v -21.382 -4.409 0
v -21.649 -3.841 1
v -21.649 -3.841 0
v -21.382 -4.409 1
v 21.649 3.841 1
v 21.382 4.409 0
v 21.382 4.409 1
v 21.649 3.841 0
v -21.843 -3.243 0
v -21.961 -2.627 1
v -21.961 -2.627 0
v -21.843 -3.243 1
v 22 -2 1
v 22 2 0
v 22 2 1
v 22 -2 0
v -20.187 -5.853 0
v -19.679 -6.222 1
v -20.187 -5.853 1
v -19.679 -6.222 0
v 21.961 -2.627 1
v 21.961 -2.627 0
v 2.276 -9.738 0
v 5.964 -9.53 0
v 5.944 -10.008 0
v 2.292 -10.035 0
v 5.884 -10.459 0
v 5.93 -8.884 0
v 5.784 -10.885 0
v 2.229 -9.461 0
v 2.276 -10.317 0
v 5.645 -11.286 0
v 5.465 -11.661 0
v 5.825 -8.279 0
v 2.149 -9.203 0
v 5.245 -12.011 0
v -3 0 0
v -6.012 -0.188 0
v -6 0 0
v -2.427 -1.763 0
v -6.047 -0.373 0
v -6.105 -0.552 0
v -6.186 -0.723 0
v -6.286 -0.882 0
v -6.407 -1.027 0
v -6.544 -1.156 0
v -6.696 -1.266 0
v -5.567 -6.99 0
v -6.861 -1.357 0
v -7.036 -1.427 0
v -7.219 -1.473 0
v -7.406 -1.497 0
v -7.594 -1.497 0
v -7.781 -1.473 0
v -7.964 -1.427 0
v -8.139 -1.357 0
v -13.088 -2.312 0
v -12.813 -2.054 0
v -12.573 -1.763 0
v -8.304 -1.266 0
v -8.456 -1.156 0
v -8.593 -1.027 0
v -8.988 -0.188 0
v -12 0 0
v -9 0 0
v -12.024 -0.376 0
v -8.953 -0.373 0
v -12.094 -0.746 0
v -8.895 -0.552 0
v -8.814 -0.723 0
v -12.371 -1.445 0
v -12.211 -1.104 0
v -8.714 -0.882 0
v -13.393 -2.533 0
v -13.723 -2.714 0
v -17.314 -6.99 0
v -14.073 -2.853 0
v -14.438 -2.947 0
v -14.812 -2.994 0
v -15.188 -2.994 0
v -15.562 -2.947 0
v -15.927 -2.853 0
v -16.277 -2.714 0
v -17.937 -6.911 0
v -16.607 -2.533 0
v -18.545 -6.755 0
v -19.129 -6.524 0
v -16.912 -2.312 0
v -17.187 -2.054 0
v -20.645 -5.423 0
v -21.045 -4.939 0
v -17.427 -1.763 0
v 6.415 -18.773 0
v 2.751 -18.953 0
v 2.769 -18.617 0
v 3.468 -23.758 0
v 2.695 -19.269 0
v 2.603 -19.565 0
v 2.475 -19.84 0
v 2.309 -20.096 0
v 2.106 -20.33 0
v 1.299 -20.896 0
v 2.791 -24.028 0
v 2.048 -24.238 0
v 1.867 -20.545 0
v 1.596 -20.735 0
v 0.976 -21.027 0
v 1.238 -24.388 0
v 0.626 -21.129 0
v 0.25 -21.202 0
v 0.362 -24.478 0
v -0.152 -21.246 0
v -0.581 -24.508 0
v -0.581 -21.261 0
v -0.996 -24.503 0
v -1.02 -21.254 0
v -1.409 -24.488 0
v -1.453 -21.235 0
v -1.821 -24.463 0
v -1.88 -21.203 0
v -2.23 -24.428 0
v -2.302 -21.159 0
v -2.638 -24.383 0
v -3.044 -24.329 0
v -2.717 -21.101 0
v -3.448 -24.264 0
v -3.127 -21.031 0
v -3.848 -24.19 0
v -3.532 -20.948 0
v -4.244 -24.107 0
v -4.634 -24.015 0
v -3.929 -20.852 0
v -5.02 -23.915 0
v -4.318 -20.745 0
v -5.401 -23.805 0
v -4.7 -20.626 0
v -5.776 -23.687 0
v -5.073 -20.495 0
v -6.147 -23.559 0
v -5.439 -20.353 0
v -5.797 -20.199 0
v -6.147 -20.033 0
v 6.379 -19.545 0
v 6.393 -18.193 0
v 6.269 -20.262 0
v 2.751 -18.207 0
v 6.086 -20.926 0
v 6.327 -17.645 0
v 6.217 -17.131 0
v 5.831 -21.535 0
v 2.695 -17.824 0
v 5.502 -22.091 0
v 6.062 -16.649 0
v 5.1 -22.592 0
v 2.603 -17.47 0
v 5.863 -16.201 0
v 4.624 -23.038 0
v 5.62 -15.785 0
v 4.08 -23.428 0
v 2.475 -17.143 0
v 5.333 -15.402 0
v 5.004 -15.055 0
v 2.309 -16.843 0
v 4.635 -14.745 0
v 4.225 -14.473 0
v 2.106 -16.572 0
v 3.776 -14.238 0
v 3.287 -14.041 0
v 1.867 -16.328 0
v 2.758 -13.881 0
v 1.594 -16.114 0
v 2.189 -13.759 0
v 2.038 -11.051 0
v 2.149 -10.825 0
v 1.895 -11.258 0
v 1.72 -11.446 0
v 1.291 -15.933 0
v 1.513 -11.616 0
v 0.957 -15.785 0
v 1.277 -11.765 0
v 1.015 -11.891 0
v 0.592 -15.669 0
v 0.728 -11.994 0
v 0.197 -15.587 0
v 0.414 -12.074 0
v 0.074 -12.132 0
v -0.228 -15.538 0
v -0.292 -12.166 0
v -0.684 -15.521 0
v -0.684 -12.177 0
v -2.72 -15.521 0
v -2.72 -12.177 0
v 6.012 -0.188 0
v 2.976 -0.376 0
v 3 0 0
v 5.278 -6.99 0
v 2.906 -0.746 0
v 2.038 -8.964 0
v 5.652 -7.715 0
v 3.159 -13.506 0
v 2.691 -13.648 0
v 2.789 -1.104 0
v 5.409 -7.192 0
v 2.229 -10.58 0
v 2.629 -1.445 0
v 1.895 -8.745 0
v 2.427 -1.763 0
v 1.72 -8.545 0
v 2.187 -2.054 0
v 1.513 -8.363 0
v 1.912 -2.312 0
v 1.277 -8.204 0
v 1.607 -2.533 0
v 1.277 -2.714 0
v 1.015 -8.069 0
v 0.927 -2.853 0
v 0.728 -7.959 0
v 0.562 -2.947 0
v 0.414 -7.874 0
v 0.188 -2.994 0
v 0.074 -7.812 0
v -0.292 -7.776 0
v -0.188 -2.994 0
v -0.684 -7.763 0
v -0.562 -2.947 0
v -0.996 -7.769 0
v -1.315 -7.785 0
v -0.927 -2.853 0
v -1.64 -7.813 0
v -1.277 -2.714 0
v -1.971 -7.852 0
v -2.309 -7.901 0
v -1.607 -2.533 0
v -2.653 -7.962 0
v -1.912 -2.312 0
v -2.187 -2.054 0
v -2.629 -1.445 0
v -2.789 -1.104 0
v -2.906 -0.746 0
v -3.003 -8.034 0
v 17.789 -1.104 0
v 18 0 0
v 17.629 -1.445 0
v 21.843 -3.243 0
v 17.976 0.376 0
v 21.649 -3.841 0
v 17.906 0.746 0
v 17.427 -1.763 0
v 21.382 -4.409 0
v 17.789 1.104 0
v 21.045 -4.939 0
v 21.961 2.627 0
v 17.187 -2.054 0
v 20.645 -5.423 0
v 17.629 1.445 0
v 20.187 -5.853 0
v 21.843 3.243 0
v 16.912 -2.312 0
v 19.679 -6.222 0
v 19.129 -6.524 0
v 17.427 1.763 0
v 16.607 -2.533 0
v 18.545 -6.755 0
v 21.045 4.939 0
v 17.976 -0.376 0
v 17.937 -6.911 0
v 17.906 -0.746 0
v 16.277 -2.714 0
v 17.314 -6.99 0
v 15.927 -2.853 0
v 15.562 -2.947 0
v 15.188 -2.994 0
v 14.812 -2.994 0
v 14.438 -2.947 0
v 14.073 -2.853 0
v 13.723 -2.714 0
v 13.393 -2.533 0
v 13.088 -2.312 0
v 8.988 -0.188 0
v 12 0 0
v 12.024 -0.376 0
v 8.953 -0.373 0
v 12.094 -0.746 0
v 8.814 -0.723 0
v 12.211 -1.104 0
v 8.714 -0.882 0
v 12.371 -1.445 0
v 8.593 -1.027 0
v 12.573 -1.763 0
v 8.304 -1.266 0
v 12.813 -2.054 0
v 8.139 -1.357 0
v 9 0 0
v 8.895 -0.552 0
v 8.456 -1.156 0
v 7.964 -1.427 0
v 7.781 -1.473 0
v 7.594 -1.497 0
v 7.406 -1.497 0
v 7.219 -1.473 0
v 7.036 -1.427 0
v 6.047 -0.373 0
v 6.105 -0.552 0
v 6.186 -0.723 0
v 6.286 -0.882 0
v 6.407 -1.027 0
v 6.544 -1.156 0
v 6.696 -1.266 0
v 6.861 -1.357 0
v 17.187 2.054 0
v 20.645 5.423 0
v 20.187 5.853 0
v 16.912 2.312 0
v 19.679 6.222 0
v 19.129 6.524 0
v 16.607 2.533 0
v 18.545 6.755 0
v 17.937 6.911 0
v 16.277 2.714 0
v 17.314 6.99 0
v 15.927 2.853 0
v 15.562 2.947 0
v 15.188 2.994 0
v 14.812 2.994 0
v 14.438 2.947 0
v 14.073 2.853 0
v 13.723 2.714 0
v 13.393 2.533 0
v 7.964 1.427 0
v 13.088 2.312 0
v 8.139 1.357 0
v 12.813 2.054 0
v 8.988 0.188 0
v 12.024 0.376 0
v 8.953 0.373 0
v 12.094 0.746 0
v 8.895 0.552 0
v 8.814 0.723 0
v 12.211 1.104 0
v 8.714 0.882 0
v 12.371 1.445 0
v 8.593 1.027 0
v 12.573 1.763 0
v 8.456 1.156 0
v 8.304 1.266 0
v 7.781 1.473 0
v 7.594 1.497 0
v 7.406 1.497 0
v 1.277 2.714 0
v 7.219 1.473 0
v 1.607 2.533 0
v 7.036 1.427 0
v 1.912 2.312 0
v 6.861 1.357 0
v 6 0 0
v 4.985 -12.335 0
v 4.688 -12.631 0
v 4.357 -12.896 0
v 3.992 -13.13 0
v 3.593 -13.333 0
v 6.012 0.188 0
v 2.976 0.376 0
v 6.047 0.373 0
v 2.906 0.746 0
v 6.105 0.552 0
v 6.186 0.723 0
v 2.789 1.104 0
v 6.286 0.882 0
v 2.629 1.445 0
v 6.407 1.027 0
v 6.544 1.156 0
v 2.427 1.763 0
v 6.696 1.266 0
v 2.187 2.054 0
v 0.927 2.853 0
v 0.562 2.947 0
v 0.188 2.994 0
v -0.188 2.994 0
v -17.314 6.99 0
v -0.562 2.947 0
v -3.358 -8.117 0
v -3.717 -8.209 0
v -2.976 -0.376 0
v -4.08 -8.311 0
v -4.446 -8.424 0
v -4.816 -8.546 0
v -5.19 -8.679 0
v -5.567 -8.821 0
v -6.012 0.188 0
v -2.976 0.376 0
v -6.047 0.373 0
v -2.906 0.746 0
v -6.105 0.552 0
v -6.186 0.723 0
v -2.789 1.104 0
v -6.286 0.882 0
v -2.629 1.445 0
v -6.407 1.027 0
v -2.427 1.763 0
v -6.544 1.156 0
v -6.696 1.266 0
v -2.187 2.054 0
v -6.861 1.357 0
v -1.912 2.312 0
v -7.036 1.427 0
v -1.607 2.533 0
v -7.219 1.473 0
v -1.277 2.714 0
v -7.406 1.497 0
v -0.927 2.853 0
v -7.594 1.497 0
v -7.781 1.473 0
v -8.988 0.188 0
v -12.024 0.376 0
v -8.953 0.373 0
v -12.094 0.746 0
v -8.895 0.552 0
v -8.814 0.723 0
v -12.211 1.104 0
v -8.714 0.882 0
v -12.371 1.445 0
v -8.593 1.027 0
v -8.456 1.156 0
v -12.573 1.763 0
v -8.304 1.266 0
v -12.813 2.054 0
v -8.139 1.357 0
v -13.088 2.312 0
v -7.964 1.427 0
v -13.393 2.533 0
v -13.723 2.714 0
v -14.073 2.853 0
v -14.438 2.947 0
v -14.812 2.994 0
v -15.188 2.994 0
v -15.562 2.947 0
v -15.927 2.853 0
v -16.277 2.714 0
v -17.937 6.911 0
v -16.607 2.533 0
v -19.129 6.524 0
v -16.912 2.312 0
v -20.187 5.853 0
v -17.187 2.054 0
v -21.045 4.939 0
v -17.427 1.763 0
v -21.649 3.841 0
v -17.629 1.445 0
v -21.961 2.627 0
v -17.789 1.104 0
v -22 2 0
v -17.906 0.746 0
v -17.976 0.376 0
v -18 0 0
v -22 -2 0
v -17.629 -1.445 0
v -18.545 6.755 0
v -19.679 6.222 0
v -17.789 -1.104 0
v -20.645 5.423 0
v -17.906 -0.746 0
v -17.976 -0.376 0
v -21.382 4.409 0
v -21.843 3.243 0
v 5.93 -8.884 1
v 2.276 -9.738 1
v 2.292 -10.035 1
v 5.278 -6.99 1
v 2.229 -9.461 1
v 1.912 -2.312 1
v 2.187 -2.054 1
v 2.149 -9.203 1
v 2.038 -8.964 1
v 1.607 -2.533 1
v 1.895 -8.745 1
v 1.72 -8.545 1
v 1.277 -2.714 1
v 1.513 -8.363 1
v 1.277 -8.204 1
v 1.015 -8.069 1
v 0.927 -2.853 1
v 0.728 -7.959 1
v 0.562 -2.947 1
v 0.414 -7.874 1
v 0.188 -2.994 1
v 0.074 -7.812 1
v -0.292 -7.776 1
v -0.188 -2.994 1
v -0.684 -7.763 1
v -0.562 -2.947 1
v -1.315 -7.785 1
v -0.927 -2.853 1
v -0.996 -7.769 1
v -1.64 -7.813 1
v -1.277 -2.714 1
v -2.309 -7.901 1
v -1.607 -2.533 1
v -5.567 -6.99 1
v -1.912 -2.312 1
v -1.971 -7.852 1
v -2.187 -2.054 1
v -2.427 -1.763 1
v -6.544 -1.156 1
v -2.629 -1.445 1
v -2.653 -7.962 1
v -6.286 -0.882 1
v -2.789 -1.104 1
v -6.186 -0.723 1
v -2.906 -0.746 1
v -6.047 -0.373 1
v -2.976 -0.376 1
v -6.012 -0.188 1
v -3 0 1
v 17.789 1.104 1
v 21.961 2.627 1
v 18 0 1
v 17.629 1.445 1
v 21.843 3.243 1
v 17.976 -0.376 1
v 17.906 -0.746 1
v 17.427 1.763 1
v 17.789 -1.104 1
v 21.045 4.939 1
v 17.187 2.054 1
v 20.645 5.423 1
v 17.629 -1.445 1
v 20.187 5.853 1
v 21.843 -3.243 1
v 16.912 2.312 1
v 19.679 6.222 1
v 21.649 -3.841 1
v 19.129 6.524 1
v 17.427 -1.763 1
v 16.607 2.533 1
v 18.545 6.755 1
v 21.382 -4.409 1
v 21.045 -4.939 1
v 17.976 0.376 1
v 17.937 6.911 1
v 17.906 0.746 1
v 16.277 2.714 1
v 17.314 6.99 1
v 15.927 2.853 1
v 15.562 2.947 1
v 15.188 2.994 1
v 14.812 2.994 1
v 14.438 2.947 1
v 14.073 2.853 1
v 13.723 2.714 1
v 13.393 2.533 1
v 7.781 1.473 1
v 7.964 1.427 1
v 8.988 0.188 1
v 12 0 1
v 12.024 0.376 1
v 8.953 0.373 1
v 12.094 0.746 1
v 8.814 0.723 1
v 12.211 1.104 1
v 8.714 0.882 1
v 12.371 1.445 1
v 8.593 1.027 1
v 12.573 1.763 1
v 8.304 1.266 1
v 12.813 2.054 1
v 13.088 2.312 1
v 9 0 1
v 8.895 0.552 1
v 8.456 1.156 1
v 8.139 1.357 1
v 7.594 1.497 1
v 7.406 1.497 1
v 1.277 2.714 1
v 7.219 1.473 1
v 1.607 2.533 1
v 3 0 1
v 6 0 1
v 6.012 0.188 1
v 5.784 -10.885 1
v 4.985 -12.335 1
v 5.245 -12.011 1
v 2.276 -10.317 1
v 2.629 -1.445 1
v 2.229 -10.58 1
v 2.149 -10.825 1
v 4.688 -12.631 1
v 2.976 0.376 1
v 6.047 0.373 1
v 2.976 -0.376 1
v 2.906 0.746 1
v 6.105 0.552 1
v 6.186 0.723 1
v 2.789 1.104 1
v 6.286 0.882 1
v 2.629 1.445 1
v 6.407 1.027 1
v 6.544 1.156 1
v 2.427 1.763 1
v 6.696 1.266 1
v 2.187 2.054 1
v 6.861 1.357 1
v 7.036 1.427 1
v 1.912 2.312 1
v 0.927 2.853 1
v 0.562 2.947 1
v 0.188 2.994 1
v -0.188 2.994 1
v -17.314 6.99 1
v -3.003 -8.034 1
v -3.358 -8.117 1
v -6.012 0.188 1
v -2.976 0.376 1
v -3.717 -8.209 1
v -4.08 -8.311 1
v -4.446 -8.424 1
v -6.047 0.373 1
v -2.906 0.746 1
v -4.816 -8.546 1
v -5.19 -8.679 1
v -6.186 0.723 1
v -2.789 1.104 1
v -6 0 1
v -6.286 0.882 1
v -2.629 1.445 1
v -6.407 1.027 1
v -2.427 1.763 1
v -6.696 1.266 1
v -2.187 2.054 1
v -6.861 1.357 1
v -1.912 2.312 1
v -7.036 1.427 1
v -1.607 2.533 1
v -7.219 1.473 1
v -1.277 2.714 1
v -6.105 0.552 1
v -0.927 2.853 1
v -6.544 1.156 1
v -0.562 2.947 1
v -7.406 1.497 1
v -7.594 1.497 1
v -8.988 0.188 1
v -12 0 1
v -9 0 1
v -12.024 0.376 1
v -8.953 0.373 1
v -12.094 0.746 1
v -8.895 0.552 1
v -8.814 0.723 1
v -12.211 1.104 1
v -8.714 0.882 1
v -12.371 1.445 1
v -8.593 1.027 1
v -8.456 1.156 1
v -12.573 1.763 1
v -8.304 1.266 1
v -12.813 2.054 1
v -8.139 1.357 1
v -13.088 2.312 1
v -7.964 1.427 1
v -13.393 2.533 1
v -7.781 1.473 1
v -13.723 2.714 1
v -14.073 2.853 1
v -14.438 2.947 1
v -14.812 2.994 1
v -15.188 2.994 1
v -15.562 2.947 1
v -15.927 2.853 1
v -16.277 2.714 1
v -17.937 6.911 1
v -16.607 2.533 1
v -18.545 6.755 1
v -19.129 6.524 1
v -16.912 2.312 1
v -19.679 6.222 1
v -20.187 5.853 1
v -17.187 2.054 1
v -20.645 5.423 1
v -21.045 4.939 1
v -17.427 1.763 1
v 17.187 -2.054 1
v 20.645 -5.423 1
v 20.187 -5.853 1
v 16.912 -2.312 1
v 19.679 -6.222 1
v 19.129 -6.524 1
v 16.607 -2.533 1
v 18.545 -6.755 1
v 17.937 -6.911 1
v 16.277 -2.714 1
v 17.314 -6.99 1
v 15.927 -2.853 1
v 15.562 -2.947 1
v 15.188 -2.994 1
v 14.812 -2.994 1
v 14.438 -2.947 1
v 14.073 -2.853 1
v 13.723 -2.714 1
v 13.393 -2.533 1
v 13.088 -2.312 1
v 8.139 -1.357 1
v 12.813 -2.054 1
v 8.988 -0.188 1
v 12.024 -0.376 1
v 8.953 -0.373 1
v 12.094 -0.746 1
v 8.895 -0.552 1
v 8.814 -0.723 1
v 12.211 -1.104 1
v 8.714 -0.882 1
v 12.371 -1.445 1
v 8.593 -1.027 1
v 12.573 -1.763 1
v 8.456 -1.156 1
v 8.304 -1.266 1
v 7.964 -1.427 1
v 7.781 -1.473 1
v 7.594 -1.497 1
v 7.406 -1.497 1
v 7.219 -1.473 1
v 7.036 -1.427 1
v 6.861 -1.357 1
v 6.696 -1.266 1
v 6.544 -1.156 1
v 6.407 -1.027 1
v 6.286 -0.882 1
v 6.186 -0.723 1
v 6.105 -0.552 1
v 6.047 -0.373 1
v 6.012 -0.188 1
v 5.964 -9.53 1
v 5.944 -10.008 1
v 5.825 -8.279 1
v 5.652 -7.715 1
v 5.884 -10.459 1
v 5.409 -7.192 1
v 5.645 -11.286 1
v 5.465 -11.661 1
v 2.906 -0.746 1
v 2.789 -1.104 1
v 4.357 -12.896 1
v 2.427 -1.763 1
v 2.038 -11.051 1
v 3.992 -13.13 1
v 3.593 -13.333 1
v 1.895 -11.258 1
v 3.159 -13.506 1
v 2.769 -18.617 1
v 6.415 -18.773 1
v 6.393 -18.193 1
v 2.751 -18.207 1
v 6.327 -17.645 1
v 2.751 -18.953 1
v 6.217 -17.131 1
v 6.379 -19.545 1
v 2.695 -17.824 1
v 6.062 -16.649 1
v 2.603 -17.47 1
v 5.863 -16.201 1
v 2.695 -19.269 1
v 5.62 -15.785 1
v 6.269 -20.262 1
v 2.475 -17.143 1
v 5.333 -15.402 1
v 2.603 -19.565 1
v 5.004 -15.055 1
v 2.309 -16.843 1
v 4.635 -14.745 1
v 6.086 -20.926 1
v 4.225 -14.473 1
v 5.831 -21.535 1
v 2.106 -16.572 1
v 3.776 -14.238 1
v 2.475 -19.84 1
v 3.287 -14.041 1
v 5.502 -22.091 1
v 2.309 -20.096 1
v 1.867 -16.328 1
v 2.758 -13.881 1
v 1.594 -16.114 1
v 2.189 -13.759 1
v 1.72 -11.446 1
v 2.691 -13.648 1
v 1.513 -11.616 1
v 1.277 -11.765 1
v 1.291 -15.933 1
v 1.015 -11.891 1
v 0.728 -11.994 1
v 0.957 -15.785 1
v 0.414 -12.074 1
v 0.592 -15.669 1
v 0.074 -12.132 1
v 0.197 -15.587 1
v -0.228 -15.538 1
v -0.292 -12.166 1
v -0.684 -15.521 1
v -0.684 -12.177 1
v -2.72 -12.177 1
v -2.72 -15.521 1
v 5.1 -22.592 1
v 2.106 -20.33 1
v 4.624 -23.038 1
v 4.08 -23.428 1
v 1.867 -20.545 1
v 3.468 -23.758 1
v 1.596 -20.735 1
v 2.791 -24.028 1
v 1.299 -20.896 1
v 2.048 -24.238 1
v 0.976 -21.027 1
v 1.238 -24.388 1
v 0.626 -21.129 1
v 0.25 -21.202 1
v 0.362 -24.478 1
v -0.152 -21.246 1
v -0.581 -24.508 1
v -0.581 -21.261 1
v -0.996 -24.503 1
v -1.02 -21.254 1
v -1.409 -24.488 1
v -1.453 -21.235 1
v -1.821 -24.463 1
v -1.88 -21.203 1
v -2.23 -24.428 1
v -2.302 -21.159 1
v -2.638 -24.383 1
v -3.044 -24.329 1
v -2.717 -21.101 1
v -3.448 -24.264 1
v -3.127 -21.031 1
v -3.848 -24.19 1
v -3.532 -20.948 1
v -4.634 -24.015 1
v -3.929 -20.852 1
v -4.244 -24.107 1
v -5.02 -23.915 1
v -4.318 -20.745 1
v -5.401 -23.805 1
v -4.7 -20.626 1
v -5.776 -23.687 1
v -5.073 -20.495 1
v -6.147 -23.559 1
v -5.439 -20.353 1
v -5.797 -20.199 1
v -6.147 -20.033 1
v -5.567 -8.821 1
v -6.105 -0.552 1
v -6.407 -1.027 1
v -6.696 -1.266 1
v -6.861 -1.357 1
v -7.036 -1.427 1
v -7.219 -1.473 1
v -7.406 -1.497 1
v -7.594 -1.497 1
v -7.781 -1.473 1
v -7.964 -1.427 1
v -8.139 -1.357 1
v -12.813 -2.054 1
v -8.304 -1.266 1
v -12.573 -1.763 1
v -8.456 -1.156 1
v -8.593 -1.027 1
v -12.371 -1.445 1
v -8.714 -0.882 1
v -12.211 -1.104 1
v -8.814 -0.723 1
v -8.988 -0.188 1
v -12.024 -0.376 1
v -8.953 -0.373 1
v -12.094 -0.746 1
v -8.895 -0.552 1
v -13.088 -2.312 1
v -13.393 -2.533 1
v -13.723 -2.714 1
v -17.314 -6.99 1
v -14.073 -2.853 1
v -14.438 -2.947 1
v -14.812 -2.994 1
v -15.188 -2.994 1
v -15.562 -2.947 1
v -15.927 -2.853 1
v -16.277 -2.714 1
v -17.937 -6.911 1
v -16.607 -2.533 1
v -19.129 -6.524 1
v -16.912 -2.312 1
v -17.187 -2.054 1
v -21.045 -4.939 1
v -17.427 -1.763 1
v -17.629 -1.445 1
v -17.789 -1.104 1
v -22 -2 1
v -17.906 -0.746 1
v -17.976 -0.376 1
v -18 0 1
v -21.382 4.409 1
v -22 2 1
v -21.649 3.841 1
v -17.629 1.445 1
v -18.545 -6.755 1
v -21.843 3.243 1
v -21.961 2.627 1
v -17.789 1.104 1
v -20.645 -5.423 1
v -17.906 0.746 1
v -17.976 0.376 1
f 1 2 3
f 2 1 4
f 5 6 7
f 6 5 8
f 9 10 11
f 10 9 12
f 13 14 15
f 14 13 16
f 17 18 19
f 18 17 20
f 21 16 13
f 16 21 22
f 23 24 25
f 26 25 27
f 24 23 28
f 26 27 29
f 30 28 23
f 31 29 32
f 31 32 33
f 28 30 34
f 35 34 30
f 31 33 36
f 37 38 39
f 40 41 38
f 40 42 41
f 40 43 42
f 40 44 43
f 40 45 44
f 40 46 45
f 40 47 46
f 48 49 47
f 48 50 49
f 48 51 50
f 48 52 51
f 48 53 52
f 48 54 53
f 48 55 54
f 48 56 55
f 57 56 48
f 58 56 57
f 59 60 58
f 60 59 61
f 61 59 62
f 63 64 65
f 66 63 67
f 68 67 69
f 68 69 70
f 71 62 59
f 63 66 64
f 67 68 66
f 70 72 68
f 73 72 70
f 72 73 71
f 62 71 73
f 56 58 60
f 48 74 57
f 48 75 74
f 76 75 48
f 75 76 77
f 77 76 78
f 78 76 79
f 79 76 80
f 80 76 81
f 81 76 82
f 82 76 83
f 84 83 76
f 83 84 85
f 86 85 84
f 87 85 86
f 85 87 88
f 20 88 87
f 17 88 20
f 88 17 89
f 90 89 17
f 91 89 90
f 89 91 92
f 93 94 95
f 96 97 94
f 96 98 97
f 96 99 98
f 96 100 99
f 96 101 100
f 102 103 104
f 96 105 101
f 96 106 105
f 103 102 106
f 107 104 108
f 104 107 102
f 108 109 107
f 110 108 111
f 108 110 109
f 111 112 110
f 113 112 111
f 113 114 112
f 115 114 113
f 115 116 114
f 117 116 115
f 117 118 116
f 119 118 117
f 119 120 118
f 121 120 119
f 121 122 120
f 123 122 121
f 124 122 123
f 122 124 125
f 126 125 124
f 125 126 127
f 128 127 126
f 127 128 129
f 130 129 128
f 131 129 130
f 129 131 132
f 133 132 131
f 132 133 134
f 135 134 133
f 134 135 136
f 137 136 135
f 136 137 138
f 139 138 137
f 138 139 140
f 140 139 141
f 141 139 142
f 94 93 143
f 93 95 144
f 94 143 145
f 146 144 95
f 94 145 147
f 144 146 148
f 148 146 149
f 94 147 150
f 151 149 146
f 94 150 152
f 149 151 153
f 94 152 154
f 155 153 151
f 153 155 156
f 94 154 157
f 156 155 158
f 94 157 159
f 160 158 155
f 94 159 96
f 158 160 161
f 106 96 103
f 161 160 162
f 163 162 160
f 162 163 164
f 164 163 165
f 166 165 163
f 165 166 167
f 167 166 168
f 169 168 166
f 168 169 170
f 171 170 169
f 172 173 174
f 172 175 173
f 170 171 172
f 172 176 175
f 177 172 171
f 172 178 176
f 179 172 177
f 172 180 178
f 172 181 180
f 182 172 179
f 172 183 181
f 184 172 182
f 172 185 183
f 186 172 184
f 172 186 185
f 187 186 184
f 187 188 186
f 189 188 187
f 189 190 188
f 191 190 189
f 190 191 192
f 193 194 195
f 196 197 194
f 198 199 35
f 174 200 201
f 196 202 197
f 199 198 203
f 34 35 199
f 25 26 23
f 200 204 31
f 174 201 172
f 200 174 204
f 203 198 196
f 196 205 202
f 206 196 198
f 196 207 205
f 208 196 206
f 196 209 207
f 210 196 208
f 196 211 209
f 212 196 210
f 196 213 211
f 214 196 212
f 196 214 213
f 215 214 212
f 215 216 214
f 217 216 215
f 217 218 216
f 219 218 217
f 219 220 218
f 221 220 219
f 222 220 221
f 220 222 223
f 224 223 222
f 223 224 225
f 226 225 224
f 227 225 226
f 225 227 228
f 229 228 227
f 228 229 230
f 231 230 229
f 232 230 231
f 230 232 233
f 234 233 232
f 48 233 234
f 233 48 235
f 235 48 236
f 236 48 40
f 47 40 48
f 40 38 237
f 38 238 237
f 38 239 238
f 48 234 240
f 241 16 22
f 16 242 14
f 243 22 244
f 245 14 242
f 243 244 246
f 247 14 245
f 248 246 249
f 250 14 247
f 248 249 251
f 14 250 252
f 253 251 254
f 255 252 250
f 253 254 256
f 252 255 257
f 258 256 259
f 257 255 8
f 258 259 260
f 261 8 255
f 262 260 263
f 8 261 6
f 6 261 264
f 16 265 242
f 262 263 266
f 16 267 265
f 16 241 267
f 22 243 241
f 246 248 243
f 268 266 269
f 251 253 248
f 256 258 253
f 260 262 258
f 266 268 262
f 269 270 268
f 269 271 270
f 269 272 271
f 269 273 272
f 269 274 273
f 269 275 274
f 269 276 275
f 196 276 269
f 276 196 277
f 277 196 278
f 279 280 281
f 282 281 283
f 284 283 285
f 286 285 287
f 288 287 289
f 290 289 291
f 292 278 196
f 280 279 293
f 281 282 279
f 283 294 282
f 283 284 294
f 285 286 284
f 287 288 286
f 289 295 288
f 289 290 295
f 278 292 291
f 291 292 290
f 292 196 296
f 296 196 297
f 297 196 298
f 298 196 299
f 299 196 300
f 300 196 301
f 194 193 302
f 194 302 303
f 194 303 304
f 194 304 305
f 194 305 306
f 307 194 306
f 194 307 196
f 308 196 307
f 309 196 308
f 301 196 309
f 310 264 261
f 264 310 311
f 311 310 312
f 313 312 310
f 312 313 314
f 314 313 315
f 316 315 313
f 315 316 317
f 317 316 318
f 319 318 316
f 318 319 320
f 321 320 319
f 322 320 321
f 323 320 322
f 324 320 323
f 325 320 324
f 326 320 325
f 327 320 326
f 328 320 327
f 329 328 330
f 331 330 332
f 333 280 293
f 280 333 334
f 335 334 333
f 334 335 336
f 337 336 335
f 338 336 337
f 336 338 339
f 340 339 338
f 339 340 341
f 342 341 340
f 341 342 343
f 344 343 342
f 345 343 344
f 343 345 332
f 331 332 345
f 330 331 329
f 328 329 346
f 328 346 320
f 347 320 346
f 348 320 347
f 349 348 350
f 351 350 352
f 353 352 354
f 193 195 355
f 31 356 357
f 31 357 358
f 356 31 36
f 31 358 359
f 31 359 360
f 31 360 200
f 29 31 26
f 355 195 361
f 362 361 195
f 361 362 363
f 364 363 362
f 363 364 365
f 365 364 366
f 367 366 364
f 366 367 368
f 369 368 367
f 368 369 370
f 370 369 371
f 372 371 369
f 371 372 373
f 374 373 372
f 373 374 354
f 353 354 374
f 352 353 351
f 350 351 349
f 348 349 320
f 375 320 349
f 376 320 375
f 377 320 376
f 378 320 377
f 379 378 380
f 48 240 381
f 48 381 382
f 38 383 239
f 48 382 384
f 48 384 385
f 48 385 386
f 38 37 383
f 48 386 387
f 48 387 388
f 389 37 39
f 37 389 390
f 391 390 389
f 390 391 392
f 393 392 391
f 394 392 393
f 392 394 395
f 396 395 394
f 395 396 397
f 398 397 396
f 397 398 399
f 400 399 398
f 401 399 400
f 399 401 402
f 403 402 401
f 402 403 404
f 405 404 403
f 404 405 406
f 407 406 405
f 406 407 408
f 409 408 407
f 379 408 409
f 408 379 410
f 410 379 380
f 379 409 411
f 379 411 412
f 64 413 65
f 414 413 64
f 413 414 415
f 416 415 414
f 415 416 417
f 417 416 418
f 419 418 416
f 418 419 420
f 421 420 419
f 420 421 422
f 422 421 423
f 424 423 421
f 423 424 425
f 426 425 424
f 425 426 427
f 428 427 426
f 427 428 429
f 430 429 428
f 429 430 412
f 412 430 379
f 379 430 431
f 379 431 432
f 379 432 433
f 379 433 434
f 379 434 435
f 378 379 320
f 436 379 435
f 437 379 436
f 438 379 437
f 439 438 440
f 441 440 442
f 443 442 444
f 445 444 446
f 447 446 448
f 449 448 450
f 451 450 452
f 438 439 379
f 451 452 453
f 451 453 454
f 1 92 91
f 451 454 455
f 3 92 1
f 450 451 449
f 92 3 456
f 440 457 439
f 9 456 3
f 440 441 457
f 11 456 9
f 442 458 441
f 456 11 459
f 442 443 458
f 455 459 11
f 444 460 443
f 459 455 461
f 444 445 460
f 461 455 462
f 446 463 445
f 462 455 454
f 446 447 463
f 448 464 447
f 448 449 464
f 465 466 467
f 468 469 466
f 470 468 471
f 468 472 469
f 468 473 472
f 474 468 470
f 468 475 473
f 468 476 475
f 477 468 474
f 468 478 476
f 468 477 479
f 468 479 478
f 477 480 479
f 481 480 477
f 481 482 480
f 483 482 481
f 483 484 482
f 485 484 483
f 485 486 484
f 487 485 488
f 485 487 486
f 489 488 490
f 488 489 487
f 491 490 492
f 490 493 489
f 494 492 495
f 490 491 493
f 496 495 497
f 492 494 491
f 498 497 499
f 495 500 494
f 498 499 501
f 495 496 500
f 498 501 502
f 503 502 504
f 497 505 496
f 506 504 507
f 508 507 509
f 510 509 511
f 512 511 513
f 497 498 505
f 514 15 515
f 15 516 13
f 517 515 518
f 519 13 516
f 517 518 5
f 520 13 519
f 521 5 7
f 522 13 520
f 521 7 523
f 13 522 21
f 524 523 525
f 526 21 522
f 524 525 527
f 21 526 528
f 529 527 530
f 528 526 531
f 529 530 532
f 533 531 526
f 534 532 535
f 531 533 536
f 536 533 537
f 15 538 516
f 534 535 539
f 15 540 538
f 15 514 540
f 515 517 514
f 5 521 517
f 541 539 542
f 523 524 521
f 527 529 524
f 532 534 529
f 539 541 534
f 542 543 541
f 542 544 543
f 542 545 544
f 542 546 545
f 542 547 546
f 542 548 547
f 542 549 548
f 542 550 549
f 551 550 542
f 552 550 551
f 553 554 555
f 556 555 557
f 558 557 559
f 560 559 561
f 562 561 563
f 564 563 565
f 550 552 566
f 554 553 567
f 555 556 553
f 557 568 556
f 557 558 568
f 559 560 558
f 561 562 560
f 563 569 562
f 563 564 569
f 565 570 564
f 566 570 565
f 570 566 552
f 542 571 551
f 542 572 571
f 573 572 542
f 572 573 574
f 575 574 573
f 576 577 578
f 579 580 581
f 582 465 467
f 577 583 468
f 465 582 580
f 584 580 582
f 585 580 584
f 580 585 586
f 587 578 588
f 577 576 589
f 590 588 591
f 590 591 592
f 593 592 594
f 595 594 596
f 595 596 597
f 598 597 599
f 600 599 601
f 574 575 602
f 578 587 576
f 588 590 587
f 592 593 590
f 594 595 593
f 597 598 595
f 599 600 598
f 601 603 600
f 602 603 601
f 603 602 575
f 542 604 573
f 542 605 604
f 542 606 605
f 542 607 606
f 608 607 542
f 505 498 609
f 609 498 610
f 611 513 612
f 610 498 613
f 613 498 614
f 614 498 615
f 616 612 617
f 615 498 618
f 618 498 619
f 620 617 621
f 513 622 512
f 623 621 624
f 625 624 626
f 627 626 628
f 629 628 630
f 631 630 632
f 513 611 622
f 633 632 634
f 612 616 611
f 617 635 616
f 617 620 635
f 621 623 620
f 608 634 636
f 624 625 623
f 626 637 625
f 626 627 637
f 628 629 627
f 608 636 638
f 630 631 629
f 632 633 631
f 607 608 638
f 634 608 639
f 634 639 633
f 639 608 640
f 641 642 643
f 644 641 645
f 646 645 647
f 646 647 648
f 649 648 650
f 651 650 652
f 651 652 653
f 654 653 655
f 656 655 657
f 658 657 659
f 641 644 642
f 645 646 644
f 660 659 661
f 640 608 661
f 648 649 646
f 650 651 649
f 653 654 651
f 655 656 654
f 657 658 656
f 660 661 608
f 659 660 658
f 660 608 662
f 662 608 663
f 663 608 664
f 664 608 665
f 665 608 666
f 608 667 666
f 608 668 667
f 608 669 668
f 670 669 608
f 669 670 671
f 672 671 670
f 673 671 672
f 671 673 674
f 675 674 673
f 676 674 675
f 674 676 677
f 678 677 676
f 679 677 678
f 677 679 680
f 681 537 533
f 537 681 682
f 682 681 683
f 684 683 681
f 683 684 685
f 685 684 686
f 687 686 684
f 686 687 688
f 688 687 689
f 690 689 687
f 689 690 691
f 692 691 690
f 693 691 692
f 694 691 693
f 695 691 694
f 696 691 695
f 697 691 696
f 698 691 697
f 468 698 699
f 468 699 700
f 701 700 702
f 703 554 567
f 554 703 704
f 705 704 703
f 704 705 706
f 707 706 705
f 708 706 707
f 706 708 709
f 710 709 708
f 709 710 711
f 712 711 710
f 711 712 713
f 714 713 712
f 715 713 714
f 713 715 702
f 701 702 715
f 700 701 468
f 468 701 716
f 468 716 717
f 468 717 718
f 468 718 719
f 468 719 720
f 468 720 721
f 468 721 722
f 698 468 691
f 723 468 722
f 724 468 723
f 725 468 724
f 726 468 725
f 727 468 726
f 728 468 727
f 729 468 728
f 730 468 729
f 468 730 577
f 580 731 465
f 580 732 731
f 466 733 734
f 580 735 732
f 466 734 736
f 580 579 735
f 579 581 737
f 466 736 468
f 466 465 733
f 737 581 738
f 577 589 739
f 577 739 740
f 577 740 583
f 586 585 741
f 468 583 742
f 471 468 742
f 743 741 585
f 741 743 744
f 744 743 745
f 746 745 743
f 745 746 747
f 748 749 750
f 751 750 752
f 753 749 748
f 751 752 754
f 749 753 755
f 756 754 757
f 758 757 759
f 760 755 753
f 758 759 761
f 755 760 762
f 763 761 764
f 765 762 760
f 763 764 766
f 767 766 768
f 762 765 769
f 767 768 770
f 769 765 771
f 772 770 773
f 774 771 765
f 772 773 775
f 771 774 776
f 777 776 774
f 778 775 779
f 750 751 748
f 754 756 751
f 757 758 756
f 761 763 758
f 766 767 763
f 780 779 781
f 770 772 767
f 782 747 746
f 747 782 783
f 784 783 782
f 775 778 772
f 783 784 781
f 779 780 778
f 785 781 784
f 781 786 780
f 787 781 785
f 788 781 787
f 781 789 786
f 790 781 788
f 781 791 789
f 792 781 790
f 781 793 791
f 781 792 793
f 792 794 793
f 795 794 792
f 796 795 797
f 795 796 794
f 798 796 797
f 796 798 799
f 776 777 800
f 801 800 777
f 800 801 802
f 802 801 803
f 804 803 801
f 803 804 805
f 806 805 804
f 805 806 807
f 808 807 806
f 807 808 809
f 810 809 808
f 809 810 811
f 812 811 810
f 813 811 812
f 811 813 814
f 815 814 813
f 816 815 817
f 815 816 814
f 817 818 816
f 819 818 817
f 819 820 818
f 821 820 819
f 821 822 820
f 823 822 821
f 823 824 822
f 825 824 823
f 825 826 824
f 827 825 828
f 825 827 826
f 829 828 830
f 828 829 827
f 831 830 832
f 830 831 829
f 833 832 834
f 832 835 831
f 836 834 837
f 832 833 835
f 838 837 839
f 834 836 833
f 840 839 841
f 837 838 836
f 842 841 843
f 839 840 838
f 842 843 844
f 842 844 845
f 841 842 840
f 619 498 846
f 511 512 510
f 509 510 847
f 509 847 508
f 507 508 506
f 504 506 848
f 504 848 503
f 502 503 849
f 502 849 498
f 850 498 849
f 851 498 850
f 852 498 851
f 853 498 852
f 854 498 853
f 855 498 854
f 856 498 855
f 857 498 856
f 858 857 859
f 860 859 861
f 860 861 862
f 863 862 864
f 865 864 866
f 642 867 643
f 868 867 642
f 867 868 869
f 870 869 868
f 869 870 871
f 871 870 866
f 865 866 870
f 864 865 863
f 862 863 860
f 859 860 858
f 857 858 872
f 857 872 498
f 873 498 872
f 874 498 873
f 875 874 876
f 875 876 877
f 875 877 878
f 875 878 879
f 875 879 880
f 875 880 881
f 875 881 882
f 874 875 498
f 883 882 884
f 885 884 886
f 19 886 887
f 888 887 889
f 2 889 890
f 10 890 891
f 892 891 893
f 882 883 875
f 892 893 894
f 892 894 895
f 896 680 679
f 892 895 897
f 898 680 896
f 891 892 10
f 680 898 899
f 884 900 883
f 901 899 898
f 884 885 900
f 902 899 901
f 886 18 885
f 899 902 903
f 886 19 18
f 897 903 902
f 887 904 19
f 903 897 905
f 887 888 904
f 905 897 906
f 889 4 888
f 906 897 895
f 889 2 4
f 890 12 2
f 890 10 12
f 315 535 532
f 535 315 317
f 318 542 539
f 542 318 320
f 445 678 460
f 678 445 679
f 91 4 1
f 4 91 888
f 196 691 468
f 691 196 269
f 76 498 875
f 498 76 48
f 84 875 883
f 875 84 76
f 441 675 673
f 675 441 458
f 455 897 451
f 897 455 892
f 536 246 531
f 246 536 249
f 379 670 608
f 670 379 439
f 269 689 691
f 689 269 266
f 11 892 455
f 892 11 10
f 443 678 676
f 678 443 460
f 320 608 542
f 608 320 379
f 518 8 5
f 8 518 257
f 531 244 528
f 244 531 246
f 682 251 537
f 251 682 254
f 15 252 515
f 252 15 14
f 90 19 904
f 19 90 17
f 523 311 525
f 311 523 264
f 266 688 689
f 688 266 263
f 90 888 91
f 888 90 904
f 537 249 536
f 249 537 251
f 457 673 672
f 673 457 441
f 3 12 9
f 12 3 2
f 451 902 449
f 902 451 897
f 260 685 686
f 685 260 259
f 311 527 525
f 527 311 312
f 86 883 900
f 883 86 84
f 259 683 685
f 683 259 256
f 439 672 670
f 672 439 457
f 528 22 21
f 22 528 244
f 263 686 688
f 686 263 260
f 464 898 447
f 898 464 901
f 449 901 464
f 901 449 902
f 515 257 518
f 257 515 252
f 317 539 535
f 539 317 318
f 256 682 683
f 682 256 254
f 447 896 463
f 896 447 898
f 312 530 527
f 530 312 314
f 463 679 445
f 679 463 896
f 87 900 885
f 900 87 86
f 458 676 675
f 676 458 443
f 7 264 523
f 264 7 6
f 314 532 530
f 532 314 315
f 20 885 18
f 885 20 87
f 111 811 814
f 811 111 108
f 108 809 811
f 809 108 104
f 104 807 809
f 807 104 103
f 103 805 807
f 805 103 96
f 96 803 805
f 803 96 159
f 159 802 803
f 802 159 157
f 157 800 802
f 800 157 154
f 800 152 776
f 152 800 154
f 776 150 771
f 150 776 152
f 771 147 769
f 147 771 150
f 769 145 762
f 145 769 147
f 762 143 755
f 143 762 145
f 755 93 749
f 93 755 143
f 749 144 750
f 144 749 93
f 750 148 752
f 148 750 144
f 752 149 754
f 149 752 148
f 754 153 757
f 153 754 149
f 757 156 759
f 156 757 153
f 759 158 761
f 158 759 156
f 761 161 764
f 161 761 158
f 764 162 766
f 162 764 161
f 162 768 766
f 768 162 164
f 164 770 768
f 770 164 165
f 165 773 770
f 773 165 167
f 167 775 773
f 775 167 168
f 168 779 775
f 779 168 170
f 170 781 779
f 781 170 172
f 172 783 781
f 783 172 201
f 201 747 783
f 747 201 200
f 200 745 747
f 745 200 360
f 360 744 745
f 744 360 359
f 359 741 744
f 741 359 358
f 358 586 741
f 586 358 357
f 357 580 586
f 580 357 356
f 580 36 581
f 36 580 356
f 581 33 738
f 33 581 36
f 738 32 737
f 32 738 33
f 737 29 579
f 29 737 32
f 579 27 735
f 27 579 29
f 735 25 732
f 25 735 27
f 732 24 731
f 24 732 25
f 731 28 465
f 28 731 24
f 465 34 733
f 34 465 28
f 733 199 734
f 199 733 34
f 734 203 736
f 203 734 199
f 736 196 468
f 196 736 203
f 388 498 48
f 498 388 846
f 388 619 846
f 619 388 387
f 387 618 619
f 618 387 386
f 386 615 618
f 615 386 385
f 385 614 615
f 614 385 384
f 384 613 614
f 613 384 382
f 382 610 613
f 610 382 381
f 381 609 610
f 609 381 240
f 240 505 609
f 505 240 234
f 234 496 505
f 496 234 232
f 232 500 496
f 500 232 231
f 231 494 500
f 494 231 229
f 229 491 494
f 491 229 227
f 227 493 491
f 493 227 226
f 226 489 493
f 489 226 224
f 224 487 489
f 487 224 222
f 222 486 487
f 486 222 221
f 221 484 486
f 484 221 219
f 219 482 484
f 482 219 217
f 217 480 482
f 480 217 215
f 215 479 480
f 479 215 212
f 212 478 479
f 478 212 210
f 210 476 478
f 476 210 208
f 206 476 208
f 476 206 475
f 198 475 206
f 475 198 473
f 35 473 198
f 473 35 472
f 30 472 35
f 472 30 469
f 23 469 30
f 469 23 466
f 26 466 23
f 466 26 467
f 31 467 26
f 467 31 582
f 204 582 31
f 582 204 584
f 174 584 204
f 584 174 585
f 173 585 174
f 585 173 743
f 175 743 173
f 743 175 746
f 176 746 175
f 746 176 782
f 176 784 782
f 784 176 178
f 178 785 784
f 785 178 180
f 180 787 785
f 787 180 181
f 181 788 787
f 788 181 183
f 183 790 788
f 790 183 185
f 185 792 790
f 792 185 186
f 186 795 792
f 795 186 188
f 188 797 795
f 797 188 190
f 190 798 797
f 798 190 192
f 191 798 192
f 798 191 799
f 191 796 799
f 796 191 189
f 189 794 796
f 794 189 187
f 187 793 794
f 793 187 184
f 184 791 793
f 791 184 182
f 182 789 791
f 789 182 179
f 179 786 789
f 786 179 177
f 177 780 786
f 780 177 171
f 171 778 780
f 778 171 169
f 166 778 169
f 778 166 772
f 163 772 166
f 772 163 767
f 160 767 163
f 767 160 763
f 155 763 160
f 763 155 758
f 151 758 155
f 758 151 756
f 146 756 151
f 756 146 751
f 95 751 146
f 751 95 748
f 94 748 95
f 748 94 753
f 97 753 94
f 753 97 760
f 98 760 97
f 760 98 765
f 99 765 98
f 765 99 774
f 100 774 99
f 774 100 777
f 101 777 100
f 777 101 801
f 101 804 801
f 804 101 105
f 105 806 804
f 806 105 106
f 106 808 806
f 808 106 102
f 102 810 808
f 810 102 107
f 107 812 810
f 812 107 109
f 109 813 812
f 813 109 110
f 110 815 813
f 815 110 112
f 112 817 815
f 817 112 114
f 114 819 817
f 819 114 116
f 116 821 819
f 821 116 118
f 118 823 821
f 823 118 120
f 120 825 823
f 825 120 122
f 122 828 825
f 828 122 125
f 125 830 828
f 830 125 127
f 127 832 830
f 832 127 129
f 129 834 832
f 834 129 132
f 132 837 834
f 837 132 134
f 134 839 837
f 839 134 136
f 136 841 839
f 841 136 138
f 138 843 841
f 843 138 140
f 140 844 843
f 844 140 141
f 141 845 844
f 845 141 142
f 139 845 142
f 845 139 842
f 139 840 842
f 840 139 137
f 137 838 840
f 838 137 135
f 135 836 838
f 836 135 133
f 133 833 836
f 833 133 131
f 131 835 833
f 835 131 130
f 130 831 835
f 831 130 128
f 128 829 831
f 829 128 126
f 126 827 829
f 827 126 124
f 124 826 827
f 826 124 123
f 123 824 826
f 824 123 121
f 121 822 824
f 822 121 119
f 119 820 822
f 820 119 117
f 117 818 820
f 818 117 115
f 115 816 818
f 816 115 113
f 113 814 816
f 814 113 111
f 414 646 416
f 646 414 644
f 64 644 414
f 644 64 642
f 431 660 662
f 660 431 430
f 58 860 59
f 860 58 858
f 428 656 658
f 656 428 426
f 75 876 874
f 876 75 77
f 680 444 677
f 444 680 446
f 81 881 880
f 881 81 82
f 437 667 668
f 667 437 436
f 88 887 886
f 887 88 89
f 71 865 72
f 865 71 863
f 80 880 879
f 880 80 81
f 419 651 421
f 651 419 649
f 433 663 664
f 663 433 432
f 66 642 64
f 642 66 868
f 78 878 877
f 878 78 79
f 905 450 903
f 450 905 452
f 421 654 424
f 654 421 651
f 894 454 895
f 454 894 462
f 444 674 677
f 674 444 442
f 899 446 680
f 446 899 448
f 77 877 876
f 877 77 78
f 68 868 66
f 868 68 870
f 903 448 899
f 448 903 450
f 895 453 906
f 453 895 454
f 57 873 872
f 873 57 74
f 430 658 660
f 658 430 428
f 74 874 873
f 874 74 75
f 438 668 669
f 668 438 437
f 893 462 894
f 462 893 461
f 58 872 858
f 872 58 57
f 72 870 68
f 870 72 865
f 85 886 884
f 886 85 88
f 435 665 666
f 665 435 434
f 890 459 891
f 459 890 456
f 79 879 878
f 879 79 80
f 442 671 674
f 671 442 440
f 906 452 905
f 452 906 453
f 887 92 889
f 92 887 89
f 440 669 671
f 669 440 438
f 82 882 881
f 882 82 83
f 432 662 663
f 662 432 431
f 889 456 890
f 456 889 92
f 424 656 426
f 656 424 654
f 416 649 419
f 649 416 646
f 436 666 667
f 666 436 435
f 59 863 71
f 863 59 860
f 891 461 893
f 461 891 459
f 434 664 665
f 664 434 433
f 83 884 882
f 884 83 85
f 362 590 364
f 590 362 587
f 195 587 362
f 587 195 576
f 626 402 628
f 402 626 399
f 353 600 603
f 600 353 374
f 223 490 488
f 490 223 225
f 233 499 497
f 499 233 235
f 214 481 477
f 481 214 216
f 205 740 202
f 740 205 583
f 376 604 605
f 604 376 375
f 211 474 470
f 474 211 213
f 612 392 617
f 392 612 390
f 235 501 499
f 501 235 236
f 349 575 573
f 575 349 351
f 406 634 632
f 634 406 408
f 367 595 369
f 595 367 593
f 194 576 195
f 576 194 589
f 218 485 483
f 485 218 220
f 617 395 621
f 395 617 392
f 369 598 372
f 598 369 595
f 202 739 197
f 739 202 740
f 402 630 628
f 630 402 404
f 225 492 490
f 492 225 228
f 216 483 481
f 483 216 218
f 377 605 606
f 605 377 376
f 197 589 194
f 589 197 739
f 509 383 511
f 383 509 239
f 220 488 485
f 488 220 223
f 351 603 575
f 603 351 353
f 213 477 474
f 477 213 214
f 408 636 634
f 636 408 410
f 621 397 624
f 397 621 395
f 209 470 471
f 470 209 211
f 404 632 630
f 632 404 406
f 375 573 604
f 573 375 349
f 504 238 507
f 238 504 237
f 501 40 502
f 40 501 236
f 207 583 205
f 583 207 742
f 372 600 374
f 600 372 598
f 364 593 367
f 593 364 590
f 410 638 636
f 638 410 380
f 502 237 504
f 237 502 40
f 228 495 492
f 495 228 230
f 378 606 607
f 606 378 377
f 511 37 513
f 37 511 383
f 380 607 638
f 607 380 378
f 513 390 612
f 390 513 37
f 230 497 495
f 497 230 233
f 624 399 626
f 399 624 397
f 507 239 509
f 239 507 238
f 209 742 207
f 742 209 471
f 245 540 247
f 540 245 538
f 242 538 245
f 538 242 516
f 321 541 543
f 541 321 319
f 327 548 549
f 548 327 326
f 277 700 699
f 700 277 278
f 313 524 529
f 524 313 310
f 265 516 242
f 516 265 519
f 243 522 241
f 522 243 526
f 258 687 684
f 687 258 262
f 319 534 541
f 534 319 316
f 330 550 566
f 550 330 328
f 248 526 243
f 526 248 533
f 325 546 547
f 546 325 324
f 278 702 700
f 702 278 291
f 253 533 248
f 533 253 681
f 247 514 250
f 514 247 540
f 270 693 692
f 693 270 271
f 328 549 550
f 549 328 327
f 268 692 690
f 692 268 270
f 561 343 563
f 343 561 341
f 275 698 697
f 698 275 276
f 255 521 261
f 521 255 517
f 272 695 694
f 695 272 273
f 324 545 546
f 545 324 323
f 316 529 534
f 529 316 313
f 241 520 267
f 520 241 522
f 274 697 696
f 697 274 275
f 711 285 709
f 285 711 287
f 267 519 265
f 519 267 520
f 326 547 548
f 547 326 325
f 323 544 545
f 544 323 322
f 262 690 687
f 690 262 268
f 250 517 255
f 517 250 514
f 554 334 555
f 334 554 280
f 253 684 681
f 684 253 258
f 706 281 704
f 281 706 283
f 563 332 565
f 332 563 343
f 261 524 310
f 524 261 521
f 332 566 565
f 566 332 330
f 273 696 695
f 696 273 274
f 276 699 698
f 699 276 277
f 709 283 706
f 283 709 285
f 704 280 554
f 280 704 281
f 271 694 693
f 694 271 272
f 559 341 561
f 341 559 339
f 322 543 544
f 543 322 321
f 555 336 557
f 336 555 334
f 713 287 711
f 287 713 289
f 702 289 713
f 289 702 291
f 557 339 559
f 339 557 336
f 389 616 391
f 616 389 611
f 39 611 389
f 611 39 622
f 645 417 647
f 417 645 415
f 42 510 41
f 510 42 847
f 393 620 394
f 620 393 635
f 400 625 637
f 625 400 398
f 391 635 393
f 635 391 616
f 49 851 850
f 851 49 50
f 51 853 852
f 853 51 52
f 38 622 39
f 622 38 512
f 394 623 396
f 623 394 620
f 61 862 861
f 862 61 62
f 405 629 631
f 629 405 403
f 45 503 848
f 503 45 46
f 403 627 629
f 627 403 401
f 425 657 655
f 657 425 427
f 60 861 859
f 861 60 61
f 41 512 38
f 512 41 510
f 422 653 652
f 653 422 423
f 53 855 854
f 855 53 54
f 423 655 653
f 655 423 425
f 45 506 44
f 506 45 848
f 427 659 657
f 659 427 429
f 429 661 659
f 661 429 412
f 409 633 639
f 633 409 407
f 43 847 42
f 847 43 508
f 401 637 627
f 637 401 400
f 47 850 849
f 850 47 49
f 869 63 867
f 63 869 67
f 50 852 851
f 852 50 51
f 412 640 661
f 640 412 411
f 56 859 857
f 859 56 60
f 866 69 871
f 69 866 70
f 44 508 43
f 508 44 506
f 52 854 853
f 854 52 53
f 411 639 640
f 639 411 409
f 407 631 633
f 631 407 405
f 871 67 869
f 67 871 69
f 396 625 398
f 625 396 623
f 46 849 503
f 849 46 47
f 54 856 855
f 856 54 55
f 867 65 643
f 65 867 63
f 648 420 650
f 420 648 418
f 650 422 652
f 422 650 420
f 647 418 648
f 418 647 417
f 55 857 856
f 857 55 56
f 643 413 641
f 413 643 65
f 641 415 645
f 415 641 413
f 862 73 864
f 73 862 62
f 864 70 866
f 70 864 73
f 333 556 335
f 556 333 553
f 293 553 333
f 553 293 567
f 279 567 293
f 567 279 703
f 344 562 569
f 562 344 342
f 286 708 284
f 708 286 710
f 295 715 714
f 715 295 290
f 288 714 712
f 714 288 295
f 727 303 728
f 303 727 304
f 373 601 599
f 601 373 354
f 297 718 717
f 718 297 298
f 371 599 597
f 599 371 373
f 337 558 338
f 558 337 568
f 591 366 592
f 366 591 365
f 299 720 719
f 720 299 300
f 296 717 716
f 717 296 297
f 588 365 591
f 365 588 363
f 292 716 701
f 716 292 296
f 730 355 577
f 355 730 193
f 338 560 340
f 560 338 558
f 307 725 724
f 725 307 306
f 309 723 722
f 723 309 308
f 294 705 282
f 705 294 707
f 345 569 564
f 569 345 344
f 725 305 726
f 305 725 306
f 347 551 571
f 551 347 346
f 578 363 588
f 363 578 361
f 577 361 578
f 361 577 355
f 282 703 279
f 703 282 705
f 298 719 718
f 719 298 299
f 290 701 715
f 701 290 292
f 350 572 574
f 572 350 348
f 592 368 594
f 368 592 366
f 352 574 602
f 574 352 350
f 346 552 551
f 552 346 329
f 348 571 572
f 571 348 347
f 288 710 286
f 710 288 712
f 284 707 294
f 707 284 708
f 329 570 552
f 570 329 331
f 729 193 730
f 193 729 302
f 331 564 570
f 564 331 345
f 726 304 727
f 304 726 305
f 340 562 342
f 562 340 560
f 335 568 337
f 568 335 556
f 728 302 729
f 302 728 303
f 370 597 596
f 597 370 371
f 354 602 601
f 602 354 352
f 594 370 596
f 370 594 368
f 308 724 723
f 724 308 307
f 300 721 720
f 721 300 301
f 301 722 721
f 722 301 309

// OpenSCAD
$fn = 50;


difference() {
	union() {
		hull() {
			translate(v = [-17.0000000000, 2.0000000000, 0]) {
				cylinder(h = 1, r = 5);
			}
			translate(v = [17.0000000000, 2.0000000000, 0]) {
				cylinder(h = 1, r = 5);
			}
			translate(v = [-17.0000000000, -2.0000000000, 0]) {
				cylinder(h = 1, r = 5);
			}
			translate(v = [17.0000000000, -2.0000000000, 0]) {
				cylinder(h = 1, r = 5);
			}
		}
		translate(v = [0, -5, 0]) {
			linear_extrude(height = 1) {
				text(font = "DejaVu Sans Mono:style=Bold", halign = "center", size = 19.0000000000, text = "3", valign = "top");
			}
		}
	}
	union() {
		translate(v = [-15.0000000000, 0.0000000000, 0]) {
			translate(v = [0, 0, -100]) {
				cylinder(h = 200, r = 3.0000000000);
			}
		}
		translate(v = [0, 0, -100]) {
			cylinder(h = 200, r = 3.0000000000);
		}
		translate(v = [15.0000000000, 0.0000000000, 0]) {
			translate(v = [0, 0, -100]) {
				cylinder(h = 200, r = 3.0000000000);
			}
		}
		translate(v = [-15.0000000000, 0.0000000000, 0]) {
			translate(v = [0, 0, -100]) {
				cylinder(h = 200, r = 1.5000000000);
			}
		}
		translate(v = [-7.5000000000, 0.0000000000, 0]) {
			translate(v = [0, 0, -100]) {
				cylinder(h = 200, r = 1.5000000000);
			}
		}
		translate(v = [0, 0, -100]) {
			cylinder(h = 200, r = 1.5000000000);
		}
		translate(v = [7.5000000000, 0.0000000000, 0]) {
			translate(v = [0, 0, -100]) {
				cylinder(h = 200, r = 1.5000000000);
			}
		}
		translate(v = [15.0000000000, 0.0000000000, 0]) {
			translate(v = [0, 0, -100]) {
				cylinder(h = 200, r = 1.5000000000);
			}
		}
	}
}
